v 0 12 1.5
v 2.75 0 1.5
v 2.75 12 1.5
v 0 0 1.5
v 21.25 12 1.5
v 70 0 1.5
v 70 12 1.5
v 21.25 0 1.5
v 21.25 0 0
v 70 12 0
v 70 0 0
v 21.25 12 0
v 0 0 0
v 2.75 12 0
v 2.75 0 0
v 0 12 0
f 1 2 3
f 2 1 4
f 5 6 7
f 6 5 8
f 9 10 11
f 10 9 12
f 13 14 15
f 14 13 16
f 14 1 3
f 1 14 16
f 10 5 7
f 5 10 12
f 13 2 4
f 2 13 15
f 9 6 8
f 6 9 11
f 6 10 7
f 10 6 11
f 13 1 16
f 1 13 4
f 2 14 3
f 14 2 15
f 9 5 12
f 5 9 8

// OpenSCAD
// 10-well comb for agarose gel casting, printed lying flat
// Units: mm. Plate thickness (Z) = 1.5 mm.

$fn = 64;

// ---- Dimensions ----
spine_len      = 70;   // spine length along X
spine_wid      = 12;   // spine width along Y
plate_thk      = 1.5;  // plate thickness along Z

tooth_count    = 10;   // number of teeth
tooth_w        = 5.0;  // tooth width along X
tooth_l        = 12;   // tooth length along Y
tooth_pitch    = 1.5;  // centre-to-centre spacing along X

eps            = 0.5;  // overcut for clean differences

// ---- Derived ----
total_tooth_w  = tooth_count * tooth_w;
gaps           = tooth_count - 1;
row_start_x    = (spine_len - total_tooth_w - gaps * tooth_pitch) / 2;

// ---- Model ----
difference() {
    union() {
        // Spine (back bar)
        translate([0, 0, 0])
            cube([spine_len, spine_wid, plate_thk]);

        // Teeth, centred on spine in X
        for (i = [0 : tooth_count - 1]) {
            translate([row_start_x + i * tooth_pitch, 0, 0])
                cube([tooth_w, tooth_l, plate_thk]);
        }
    }

    // Wells: cut into the -Y side of the plate, through full thickness
    for (i = [0 : tooth_count - 1]) {
        translate([row_start_x + i * tooth_pitch - eps, -eps, 0])
            cube([tooth_w, tooth_l + 2 * eps, plate_thk + 2 * eps]);
    }
}
